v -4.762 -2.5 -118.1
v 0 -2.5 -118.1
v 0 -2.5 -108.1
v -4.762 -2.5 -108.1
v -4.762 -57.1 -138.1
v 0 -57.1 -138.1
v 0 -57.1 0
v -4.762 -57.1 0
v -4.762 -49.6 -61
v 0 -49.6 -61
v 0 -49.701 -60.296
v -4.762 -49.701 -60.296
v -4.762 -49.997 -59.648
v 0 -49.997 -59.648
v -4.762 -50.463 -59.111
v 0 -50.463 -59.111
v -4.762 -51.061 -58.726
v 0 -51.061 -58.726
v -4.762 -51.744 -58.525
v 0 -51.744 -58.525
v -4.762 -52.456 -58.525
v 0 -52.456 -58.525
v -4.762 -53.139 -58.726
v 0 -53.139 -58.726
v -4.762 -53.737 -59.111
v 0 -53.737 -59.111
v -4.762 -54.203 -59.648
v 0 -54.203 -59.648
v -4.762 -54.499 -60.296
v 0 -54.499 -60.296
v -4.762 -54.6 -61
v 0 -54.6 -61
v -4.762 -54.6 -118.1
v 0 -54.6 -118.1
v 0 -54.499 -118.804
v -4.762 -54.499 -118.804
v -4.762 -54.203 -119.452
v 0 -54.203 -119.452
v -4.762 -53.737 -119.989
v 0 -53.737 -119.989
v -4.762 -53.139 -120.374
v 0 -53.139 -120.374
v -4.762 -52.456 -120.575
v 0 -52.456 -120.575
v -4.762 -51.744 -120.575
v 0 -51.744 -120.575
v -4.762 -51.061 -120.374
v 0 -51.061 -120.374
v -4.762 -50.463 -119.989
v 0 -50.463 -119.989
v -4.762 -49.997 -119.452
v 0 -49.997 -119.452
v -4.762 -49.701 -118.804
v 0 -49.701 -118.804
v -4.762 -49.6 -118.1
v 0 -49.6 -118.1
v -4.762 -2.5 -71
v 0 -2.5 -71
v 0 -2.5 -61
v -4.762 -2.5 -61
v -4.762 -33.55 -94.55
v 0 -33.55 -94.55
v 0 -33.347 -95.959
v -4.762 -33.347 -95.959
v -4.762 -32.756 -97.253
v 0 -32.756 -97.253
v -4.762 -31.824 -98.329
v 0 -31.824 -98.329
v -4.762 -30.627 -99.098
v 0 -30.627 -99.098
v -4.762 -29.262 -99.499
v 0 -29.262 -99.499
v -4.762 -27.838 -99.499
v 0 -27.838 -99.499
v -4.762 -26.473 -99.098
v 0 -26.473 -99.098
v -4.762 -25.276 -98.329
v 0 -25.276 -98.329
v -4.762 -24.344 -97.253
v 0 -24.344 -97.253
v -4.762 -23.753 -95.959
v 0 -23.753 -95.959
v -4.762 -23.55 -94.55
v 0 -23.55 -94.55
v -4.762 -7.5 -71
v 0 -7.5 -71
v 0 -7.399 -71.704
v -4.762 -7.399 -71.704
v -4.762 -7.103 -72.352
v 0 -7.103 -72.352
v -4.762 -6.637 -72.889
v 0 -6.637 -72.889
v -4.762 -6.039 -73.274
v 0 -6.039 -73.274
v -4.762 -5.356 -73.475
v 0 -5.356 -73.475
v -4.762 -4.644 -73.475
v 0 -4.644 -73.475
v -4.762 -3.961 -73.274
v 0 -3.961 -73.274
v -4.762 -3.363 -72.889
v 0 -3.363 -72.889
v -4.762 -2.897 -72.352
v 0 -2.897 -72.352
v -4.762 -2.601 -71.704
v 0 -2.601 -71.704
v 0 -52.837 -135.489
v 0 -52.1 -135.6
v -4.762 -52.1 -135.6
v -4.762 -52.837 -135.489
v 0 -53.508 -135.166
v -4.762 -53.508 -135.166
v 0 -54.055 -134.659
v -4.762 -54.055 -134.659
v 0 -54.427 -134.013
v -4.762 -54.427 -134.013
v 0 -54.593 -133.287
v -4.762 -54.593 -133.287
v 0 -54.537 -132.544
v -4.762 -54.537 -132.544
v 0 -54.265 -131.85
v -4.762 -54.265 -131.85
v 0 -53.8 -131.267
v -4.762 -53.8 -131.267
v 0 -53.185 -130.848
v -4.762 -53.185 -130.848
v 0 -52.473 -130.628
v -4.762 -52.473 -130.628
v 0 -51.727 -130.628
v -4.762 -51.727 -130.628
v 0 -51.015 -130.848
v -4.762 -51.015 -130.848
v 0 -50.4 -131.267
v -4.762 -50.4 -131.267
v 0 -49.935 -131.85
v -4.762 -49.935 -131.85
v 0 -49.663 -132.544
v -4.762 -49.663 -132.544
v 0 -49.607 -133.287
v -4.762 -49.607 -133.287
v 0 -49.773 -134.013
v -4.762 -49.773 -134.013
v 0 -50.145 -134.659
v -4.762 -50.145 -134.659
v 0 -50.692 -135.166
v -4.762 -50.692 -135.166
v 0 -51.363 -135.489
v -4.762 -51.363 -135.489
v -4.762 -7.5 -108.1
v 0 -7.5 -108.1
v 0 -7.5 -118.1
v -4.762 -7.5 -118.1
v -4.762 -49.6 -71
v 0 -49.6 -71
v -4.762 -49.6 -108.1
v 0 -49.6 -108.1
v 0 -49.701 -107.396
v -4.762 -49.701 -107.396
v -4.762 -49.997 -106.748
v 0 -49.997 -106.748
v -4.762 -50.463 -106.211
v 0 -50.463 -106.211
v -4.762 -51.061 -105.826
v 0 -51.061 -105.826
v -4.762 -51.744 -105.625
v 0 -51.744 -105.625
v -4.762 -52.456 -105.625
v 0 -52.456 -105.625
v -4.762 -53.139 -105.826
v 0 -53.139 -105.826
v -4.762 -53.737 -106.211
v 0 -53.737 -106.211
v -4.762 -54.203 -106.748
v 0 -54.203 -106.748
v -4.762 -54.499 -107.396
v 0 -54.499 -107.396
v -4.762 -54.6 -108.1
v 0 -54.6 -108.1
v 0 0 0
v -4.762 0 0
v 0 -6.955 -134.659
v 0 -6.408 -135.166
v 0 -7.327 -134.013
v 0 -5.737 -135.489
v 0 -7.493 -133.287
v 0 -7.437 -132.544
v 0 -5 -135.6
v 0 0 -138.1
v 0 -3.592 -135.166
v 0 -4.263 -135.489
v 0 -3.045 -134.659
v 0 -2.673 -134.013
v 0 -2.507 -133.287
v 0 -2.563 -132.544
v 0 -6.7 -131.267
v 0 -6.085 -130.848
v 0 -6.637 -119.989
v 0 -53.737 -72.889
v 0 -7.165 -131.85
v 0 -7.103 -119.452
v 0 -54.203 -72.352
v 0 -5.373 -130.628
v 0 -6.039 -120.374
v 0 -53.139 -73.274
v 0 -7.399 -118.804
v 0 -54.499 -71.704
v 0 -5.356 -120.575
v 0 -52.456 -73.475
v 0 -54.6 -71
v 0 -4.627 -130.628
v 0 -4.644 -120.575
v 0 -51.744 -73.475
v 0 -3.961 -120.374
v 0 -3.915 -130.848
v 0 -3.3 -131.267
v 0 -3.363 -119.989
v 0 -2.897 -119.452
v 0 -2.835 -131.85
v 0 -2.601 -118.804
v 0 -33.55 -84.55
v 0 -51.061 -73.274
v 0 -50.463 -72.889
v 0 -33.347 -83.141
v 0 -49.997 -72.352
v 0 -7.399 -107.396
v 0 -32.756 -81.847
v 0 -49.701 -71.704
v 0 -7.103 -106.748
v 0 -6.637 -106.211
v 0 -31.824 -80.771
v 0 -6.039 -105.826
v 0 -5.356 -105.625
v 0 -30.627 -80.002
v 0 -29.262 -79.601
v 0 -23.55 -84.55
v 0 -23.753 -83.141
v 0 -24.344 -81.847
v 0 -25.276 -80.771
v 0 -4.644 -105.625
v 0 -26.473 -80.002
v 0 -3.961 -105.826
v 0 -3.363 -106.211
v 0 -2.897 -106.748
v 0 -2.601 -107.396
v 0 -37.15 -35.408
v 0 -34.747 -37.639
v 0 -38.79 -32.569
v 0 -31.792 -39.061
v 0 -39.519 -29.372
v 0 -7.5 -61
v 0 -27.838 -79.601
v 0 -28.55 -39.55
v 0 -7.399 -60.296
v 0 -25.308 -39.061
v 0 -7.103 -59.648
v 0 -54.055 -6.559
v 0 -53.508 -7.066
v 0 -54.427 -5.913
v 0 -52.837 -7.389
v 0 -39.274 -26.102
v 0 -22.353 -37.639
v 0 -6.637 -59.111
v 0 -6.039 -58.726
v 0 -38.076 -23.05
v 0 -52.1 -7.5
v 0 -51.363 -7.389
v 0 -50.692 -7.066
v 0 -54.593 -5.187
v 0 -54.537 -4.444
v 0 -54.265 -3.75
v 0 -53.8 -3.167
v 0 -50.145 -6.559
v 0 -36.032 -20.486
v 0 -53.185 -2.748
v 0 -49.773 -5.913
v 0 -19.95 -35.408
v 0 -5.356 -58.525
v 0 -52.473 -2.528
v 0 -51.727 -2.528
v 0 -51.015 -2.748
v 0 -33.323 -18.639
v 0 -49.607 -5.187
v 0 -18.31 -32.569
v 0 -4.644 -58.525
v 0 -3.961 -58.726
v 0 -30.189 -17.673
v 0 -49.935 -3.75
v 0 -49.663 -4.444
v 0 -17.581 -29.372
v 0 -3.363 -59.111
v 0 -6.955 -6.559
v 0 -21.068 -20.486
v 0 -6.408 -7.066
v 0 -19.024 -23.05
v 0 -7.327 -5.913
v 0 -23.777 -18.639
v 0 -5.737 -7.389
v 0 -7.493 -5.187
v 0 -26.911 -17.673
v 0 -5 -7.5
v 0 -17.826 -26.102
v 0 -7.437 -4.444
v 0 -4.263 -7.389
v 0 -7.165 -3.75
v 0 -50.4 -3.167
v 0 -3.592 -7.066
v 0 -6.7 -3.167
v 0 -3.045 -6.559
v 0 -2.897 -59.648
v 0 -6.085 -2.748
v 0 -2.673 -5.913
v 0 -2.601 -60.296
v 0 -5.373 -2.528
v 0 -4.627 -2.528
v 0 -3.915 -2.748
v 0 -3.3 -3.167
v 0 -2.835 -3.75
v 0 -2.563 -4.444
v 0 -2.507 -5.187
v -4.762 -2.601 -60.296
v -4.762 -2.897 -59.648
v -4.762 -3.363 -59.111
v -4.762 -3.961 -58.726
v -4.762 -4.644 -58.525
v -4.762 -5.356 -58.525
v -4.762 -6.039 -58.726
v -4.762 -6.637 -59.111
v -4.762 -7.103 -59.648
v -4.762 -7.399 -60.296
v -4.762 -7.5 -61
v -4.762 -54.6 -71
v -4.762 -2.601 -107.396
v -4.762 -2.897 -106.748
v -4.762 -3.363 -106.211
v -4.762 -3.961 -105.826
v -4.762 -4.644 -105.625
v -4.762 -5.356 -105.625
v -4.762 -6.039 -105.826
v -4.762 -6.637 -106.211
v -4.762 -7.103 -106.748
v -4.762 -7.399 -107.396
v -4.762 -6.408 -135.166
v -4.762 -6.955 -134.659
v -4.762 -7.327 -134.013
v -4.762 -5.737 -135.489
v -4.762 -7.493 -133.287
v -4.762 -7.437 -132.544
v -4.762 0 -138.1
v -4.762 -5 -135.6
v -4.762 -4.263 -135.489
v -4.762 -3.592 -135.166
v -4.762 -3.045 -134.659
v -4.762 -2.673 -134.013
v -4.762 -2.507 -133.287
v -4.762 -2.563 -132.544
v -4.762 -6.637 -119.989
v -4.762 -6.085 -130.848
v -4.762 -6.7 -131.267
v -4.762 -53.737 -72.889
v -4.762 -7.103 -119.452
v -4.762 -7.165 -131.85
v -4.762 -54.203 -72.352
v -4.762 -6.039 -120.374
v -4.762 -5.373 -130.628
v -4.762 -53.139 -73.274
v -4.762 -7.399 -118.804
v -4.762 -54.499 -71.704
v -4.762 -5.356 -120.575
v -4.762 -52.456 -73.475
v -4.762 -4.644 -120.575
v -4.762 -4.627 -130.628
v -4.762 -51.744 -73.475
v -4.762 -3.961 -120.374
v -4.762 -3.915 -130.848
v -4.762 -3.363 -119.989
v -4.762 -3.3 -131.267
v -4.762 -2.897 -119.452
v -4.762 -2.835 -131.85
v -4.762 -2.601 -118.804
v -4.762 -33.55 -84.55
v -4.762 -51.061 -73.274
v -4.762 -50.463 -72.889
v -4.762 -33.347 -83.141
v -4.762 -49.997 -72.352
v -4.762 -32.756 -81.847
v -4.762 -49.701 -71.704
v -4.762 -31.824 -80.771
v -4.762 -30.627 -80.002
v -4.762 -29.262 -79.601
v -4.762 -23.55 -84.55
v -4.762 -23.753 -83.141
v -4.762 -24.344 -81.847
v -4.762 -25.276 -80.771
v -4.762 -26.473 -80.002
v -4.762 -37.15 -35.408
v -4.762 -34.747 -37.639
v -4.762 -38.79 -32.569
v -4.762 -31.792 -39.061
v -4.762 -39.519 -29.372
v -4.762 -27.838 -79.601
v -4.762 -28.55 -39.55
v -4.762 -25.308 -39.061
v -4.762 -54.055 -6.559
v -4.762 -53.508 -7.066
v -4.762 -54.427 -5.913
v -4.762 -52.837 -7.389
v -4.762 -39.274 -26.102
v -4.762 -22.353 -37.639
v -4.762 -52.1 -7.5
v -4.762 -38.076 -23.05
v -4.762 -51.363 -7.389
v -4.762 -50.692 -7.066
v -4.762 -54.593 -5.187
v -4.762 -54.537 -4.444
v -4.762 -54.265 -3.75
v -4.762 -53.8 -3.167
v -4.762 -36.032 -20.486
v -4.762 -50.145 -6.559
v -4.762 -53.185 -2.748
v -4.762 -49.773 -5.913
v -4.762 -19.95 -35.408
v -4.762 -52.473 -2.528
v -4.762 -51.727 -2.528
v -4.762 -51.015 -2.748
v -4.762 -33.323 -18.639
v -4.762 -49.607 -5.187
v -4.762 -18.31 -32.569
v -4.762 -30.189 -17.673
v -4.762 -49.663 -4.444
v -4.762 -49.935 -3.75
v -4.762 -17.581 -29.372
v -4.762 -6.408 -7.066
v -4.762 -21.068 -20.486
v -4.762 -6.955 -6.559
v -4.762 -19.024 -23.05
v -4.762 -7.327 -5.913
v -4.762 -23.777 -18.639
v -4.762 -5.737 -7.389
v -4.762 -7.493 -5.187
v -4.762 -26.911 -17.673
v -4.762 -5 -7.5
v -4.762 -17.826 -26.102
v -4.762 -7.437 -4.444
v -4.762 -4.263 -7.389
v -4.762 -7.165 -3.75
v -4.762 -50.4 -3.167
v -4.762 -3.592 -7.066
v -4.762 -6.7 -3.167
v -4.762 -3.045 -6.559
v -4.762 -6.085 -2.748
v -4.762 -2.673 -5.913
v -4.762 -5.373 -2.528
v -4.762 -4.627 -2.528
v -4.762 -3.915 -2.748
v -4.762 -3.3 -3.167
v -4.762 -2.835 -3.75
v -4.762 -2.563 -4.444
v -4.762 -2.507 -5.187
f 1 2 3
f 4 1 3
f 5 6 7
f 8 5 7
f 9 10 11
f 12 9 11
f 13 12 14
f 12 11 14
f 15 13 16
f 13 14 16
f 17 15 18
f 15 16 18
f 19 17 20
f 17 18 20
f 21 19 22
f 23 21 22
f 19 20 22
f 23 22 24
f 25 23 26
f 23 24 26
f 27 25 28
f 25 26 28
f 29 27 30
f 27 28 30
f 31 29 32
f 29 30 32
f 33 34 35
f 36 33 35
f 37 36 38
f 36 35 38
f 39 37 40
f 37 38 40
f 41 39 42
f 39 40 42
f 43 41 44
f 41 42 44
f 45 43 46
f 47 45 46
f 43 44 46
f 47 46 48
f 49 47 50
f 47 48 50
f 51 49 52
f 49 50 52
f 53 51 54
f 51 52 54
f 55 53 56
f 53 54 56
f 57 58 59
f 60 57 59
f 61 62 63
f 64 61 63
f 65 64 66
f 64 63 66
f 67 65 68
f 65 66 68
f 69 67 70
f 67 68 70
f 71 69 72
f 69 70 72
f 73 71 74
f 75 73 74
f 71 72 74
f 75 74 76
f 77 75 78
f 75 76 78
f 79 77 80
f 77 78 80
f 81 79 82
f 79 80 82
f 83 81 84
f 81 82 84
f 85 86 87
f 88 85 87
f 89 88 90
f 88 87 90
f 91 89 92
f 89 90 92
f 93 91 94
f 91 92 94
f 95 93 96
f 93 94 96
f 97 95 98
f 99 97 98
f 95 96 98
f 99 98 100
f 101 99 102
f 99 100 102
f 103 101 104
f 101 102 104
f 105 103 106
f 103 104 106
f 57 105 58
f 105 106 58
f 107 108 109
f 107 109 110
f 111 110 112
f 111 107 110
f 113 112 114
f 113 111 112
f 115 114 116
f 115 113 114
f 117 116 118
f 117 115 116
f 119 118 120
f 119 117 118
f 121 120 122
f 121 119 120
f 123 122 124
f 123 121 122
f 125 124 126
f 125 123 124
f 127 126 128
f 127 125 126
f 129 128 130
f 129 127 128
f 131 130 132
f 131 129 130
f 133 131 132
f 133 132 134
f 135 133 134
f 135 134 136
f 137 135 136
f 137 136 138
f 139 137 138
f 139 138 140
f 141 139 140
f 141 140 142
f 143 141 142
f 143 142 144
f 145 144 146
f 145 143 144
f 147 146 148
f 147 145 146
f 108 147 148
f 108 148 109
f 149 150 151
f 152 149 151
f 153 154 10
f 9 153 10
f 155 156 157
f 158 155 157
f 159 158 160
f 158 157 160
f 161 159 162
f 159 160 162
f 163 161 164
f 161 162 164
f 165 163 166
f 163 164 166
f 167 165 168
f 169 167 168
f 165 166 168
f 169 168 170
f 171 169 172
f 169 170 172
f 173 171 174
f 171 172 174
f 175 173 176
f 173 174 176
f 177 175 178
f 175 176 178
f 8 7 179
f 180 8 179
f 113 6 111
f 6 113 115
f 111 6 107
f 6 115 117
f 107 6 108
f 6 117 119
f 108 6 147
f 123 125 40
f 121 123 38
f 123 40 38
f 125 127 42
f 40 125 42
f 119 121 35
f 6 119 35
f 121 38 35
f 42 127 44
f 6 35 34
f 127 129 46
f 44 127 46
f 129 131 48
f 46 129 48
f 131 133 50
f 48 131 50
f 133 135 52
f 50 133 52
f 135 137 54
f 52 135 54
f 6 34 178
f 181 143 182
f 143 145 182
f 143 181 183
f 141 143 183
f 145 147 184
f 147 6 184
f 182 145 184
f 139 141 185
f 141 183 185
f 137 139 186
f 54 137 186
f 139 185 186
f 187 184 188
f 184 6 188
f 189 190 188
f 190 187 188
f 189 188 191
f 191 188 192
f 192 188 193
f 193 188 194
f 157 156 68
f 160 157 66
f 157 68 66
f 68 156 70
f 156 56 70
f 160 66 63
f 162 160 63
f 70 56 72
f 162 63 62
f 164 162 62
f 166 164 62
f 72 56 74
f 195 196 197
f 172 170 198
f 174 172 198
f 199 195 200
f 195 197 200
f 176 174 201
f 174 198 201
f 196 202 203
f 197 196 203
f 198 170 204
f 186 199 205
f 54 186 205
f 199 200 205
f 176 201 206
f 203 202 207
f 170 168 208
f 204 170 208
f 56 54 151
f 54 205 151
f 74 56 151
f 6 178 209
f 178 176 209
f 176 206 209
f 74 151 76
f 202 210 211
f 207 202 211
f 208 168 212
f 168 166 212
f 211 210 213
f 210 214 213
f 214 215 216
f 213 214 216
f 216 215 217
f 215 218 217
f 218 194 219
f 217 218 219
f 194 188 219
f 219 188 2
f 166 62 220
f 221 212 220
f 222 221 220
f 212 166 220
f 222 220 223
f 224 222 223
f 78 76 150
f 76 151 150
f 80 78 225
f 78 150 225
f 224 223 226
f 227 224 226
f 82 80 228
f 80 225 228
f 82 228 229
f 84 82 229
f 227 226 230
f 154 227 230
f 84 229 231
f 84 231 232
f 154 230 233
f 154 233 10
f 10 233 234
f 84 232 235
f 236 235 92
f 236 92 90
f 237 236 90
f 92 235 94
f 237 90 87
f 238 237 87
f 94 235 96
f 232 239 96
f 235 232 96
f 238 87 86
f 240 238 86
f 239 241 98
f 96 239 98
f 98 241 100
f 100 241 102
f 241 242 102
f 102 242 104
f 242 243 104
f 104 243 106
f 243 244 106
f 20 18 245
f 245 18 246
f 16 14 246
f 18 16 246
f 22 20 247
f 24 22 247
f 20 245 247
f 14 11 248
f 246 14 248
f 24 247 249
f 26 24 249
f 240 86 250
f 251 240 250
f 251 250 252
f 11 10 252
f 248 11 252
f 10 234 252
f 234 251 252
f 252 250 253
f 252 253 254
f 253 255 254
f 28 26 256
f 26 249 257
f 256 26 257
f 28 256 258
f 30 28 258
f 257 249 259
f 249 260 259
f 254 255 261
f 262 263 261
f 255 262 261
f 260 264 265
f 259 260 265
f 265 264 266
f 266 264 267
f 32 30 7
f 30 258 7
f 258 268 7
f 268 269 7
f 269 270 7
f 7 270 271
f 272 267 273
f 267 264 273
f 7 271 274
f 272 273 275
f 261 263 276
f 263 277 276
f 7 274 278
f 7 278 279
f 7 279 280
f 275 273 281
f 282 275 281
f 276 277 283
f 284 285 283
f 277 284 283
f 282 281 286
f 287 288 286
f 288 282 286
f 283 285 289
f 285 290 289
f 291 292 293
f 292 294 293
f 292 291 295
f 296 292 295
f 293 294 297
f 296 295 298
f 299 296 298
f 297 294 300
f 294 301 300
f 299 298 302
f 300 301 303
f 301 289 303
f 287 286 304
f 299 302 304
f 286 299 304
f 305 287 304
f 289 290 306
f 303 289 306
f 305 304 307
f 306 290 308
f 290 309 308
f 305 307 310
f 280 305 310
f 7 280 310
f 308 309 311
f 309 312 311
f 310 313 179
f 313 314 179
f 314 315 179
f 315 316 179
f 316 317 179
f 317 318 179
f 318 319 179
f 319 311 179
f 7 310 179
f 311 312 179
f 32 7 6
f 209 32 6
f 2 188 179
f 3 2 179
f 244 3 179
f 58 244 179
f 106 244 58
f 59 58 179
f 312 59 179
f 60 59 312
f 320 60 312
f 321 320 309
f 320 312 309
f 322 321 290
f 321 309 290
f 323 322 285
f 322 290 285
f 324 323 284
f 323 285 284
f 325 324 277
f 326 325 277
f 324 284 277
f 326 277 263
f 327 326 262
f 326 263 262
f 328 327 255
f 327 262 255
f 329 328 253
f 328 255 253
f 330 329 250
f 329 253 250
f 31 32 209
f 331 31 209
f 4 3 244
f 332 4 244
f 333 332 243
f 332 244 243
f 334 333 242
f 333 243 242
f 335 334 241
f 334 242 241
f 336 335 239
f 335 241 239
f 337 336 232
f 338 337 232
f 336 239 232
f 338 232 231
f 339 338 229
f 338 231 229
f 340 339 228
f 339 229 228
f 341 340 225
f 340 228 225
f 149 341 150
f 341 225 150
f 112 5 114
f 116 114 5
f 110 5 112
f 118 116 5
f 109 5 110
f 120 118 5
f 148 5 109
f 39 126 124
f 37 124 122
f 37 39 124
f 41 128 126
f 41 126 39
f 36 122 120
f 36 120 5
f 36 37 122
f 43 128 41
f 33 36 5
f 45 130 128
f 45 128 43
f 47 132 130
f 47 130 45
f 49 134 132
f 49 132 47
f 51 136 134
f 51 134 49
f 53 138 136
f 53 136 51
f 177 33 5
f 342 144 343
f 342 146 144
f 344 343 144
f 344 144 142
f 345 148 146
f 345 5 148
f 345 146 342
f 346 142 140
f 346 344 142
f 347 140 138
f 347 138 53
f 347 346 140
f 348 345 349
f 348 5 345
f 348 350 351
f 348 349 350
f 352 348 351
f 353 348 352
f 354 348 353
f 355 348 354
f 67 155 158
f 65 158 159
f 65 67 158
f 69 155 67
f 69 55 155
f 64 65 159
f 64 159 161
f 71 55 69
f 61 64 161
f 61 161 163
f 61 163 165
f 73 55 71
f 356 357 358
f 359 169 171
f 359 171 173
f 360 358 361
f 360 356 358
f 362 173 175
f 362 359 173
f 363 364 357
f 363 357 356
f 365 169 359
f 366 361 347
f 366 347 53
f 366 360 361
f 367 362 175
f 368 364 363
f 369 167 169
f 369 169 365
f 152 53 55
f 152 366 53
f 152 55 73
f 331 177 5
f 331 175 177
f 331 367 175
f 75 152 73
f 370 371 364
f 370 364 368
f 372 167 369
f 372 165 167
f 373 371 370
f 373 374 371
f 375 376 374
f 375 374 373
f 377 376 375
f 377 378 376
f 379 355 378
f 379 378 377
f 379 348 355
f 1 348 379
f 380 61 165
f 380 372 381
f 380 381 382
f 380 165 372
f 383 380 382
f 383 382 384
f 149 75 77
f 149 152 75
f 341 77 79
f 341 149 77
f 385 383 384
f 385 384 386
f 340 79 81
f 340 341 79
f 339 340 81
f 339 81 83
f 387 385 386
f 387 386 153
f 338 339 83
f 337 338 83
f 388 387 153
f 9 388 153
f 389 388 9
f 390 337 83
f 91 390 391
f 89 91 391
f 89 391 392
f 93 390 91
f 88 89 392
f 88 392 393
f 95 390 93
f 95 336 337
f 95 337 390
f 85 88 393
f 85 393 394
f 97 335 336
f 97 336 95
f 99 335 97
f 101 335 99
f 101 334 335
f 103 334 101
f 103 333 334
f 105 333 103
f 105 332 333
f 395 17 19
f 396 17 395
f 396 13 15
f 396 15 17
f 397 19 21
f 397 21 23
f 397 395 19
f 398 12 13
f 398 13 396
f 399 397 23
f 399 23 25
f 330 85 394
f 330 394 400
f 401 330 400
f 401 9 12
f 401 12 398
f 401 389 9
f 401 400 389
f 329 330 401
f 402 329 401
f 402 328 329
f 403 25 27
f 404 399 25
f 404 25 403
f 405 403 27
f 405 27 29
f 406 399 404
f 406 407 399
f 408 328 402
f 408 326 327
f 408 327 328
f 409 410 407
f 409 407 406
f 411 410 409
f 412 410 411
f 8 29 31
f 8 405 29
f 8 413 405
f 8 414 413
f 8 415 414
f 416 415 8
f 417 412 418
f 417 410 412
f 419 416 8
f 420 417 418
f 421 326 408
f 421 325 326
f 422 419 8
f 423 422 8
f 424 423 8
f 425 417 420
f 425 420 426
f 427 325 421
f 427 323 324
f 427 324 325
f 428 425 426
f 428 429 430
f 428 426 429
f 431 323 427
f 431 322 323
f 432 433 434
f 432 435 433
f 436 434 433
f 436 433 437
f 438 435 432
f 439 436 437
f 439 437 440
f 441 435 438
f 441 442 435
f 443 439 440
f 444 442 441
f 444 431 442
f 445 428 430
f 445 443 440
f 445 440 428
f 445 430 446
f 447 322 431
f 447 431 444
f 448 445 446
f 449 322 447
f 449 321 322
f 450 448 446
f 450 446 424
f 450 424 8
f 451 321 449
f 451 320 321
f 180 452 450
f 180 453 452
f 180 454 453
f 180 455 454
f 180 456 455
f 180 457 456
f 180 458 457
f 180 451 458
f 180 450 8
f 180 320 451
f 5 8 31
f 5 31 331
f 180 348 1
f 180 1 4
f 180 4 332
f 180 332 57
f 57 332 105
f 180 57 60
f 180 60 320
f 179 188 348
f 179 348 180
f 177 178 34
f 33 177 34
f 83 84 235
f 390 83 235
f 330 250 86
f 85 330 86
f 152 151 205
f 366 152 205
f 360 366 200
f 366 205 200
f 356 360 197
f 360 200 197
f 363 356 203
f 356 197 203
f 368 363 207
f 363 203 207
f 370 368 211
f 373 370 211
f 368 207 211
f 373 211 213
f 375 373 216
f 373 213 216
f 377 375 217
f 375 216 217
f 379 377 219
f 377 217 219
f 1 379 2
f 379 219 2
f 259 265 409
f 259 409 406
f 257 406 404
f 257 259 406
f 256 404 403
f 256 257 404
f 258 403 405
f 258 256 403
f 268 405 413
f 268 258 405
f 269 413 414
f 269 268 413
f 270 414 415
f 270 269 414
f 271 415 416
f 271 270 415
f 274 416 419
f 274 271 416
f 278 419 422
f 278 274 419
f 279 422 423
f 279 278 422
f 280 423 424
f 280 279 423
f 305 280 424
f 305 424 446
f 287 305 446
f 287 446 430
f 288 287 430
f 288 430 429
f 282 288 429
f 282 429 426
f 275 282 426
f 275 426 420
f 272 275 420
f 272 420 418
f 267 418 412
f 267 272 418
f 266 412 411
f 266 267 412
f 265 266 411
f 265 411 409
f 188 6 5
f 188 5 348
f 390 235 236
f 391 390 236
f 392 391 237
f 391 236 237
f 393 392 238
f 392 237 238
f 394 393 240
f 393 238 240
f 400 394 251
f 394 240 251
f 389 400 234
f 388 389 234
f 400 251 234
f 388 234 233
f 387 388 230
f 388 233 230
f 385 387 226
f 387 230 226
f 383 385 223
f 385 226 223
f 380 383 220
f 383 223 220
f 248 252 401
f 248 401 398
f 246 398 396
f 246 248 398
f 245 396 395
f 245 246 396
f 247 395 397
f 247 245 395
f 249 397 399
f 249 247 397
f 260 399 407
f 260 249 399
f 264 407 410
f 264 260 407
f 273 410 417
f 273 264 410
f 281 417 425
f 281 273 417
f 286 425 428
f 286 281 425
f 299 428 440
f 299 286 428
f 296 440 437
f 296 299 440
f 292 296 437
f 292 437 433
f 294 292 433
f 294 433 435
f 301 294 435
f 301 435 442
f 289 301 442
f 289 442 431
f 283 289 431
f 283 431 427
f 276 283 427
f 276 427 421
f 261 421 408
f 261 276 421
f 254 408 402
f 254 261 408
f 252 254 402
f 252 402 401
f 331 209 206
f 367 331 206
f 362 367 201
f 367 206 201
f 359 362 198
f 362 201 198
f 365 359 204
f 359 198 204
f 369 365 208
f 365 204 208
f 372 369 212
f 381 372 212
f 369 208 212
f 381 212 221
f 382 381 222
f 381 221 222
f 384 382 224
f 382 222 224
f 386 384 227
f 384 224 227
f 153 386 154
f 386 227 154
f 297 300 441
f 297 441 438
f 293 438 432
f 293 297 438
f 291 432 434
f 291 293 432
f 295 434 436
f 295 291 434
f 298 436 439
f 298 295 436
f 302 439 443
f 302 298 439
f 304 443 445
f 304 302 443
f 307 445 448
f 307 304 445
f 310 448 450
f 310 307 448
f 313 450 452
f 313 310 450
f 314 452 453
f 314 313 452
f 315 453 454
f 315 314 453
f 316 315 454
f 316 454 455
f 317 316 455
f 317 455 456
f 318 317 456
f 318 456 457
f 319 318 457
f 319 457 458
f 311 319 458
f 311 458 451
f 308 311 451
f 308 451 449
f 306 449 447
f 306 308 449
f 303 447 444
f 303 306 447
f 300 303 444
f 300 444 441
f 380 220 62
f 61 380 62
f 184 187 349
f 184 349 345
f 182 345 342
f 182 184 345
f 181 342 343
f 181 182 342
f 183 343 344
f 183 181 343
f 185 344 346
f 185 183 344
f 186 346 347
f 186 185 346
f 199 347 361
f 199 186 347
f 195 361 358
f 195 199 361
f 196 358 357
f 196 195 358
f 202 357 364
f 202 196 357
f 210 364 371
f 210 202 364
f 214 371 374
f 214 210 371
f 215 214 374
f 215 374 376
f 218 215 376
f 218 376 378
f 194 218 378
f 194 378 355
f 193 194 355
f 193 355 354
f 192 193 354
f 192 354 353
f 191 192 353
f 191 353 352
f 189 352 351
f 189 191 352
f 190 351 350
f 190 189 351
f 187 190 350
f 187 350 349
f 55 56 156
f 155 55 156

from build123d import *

# Parameters (mm, degrees)
SKETCH1_W           = 138.1
SKETCH1_H           = 57.1
SKETCH1_R           = 2.5
SKETCH1_R_2         = 11
BOSS_EXTRUDE1_DEPTH = 4.7625


with BuildPart() as part:
    # Sketch1 → Boss-Extrude1 (new body)
    with BuildSketch(Plane.ZY):
        with Locations((-69.05, -28.55)):
            Rectangle(SKETCH1_W, SKETCH1_H)
        with Locations(Location((-133.1, -5, 0), (0, 0, 180))):
            Circle(SKETCH1_R, mode=Mode.SUBTRACT)
        with Locations(Location((-133.1, -52.1, 0), (0, 0, 180))):
            Circle(SKETCH1_R, mode=Mode.SUBTRACT)
        with Locations(Location((-28.55, -28.55, 0), (0, 0, 180))):
            Circle(SKETCH1_R_2, mode=Mode.SUBTRACT)
        with Locations(Location((-5, -5, 0), (0, 0, 180))):
            Circle(SKETCH1_R, mode=Mode.SUBTRACT)
        with Locations(Location((-5, -52.1, 0), (0, 0, 180))):
            Circle(SKETCH1_R, mode=Mode.SUBTRACT)
        with BuildLine():
            Line((-108.1, -7.5), (-118.1, -7.5))
            ThreePointArc((-118.1, -7.5), (-120.6, -5), (-118.1, -2.5))
            Line((-118.1, -2.5), (-108.1, -2.5))
            ThreePointArc((-108.1, -2.5), (-105.6, -5), (-108.1, -7.5))
        make_face(mode=Mode.SUBTRACT)
        with BuildLine():
            Line((-108.1, -54.6), (-118.1, -54.6))
            ThreePointArc((-118.1, -54.6), (-120.6, -52.1), (-118.1, -49.6))
            Line((-118.1, -49.6), (-108.1, -49.6))
            ThreePointArc((-108.1, -49.6), (-105.6, -52.1), (-108.1, -54.6))
        make_face(mode=Mode.SUBTRACT)
        with BuildLine():
            Line((-61, -7.5), (-71, -7.5))
            ThreePointArc((-71, -7.5), (-73.5, -5), (-71, -2.5))
            Line((-71, -2.5), (-61, -2.5))
            ThreePointArc((-61, -2.5), (-58.5, -5), (-61, -7.5))
        make_face(mode=Mode.SUBTRACT)
        with BuildLine():
            Line((-61, -54.6), (-71, -54.6))
            ThreePointArc((-71, -54.6), (-73.5, -52.1), (-71, -49.6))
            Line((-71, -49.6), (-61, -49.6))
            ThreePointArc((-61, -49.6), (-58.5, -52.1), (-61, -54.6))
        make_face(mode=Mode.SUBTRACT)
        with BuildLine():
            Line((-84.55, -33.55), (-94.55, -33.55))
            ThreePointArc((-94.55, -33.55), (-99.55, -28.55), (-94.55, -23.55))
            Line((-94.55, -23.55), (-84.55, -23.55))
            ThreePointArc((-84.55, -23.55), (-79.55, -28.55), (-84.55, -33.55))
        make_face(mode=Mode.SUBTRACT)
    extrude(amount=BOSS_EXTRUDE1_DEPTH)


solid = part.part
